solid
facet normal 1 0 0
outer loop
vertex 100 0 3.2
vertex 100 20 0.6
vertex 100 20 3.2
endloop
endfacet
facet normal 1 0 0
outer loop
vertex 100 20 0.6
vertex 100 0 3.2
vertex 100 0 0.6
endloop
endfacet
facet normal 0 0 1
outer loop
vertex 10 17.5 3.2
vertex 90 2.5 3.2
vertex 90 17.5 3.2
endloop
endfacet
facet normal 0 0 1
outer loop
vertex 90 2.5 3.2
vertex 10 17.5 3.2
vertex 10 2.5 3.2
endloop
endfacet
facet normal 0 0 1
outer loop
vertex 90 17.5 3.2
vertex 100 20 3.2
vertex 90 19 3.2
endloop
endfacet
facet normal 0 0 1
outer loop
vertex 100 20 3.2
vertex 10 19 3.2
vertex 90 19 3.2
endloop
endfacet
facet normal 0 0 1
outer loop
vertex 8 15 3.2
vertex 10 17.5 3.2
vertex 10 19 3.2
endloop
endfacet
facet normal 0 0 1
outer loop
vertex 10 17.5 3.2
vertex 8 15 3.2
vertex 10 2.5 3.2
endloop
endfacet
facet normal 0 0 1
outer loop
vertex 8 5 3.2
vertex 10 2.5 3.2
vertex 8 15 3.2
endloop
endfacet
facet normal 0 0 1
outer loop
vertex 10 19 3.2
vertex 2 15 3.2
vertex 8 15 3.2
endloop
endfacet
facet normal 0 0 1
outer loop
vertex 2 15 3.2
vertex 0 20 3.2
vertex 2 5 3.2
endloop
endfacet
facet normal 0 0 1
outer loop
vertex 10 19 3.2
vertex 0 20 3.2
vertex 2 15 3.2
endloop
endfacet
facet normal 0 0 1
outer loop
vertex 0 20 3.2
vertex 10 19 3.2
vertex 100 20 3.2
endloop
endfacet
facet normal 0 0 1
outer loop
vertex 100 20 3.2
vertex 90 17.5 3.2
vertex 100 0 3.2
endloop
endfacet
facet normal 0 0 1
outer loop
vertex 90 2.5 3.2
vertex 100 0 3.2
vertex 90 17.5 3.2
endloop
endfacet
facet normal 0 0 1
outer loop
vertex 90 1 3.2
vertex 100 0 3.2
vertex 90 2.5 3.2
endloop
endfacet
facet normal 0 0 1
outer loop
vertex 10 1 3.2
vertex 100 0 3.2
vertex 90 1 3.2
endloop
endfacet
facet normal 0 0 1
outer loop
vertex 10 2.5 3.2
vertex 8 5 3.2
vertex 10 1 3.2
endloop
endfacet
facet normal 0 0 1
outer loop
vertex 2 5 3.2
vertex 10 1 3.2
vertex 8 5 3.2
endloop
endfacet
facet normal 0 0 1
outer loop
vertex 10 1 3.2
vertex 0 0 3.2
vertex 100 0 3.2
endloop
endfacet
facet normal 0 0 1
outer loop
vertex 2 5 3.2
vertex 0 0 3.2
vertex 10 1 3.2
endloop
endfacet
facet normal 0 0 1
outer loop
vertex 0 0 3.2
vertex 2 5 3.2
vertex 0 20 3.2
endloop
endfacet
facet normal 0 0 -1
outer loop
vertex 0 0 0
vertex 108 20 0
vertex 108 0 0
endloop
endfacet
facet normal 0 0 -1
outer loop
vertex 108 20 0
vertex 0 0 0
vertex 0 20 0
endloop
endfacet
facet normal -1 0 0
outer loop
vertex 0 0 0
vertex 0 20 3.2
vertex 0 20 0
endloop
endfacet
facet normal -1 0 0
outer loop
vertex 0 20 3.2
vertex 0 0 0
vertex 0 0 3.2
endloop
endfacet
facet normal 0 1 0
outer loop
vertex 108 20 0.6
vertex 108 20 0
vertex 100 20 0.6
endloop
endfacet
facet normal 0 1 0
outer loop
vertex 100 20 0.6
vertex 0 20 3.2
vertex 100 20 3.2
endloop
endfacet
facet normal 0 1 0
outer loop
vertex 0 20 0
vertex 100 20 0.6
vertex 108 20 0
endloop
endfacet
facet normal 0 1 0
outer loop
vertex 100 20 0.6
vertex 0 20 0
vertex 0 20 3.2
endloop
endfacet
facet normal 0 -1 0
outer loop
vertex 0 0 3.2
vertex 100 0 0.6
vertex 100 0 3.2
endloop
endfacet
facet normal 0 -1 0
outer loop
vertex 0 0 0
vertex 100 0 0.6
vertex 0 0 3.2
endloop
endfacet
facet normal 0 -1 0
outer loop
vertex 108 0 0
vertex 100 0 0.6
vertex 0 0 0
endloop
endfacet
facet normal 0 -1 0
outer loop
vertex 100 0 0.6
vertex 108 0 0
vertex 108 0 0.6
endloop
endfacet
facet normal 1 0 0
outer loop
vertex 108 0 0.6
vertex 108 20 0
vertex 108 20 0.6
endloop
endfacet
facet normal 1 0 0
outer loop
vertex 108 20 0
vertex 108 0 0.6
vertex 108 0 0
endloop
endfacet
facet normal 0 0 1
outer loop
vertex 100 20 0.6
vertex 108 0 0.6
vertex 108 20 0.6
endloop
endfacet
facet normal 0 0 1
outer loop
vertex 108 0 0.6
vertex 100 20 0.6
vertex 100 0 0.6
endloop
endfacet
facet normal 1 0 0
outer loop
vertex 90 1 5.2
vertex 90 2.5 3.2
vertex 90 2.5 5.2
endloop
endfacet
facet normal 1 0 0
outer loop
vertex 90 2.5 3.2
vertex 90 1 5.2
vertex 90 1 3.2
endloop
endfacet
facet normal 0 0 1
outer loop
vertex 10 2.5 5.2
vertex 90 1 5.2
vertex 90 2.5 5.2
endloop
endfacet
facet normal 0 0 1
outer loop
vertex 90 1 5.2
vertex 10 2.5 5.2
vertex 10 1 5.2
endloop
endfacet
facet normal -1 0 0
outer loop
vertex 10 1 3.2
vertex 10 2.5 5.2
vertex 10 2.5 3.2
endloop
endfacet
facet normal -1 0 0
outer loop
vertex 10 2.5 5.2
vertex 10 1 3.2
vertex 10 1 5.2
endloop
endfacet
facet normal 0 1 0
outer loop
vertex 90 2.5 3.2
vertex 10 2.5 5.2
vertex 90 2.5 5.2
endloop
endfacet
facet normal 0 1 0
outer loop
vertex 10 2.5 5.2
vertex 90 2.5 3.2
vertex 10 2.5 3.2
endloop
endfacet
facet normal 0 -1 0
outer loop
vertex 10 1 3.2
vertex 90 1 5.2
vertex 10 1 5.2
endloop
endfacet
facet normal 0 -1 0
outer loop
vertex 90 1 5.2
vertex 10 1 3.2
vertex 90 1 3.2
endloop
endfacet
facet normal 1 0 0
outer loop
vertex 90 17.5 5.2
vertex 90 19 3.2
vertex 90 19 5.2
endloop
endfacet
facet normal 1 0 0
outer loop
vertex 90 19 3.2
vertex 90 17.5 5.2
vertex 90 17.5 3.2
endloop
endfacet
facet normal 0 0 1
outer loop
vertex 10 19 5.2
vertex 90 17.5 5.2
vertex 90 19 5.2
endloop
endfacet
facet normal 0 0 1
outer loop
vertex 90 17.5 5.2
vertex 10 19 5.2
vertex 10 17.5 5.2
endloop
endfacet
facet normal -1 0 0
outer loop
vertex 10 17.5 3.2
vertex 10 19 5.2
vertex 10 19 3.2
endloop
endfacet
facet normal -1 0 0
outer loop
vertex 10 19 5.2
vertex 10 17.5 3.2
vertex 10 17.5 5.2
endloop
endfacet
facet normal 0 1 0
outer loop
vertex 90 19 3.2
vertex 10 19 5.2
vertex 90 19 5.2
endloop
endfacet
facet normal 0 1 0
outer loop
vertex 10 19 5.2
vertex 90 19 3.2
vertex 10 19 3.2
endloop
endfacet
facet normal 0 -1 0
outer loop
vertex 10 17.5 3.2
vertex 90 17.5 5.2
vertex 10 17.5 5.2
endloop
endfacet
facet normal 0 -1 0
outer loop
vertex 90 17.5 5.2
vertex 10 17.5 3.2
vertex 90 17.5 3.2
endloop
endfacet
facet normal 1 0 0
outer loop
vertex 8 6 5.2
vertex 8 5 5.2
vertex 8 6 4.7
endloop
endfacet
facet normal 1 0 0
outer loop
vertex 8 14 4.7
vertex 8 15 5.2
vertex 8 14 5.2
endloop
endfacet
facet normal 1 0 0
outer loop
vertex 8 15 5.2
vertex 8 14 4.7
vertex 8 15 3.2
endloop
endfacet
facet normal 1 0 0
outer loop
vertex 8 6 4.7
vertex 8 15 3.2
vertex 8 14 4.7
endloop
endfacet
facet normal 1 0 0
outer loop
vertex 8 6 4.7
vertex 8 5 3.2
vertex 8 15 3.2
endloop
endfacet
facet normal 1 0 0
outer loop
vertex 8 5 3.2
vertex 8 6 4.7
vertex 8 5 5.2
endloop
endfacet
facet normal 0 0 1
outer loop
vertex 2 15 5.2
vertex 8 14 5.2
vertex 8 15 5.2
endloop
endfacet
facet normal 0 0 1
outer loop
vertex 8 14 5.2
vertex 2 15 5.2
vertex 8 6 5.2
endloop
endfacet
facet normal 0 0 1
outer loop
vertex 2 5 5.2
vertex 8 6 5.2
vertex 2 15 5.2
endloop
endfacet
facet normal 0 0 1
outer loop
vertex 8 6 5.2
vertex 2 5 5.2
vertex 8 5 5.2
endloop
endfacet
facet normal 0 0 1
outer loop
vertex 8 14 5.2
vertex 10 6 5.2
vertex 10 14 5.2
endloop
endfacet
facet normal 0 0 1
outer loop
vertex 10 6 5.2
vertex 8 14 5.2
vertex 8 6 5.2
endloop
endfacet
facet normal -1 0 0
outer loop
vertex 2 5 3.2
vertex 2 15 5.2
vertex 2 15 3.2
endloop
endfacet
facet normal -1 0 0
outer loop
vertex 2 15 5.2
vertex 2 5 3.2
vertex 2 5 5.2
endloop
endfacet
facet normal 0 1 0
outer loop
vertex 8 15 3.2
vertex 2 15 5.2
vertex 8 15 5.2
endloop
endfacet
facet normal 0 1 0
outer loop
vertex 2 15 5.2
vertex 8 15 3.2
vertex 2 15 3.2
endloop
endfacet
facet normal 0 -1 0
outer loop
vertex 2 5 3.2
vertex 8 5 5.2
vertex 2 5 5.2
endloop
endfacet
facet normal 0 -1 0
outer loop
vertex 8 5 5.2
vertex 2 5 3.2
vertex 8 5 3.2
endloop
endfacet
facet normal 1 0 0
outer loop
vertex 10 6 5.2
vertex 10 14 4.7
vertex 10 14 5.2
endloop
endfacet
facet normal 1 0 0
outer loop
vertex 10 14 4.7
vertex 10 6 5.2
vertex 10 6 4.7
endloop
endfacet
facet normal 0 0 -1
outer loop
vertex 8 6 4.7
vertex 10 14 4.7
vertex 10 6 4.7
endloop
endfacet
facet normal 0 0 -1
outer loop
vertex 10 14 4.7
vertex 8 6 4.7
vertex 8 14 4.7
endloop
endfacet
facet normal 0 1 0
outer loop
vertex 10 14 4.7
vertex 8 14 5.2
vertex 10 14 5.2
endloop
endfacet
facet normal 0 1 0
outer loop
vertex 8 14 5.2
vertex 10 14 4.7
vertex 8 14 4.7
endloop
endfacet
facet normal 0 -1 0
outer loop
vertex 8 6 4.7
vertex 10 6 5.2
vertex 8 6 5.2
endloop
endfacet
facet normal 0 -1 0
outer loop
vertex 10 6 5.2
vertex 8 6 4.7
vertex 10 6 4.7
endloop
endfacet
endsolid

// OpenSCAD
// Bag clip with living hinge - PETG, 0.4mm nozzle, no supports
// One piece, printed open flat. Lower arm + upper arm meet at hinge mid-plane.
// Fold map (180 about pivot): F(x) = 216 - x, F(z) = 10.4 - z.

part = "arm_lower"; // [arm_lower, arm_upper, assembly]
cadverify_only = "";

Lbody = 100;
Wbody = 20;
Tbody = 3.2;
Hhalf = 8;
Thinge = 0.6;
Bgap = 2.0;
Xpiv = 108;
Zpiv = 5.2;

module instance(name, part, unit = 1) {
    echo(cadverify_instance = [name, part, unit]);
    if (cadverify_only == "" || cadverify_only == name) children();
}

module arm_lower() {
    cube([Lbody, Wbody, Tbody], false);
    translate([Lbody-0.1, 0, 0])
        cube([Hhalf+0.1, Wbody, Thinge], false);
    translate([10, 1, Tbody-0.1])
        cube([80, 1.5, Bgap+0.1], false);
    translate([10, 17.5, Tbody-0.1])
        cube([80, 1.5, Bgap+0.1], false);
    translate([2, 5, Tbody-0.1])
        cube([6, 10, Bgap+0.1], false);
    translate([7.9, 6, 4.7])
        cube([2.1, 8, 0.5], false);
}

module arm_upper() {
    cube([Hhalf+0.1, Wbody, Thinge], false);
    translate([Hhalf-0.1, 0, 0])
        cube([Lbody+0.1, Wbody, Tbody], false);
    translate([100, 5, Tbody-0.1])
        cube([6, 10, Bgap+0.1], false);
    translate([97.9, 6, 4.7])
        cube([2.5, 8, 0.5], false);
    translate([107.9, 6, 0])
        cube([8.1, 8, Tbody], false);
}

if (part == "arm_lower") {
    echo(cadverify_spec = [
        ["bounds", [[0, 0, 0], [108, 20, 5.2]]],
        ["bodies", 1],
        ["through_holes", 0],
        ["support_faces", [["bed", "-z", 1500]]],
        ["overhangs_allowed", [["latch lip", [[7.5, 5.5, 4.5], [10.5, 14.5, 5.5]]]]],
        ["copies", 1],
        ["details", [
            ["arm", "material", [[20, 6, 1.0], [80, 14, 2.2]], 1],
            ["arm_wall", "thickness", [50, 10, 10], [0, 0, -1], 3.2],
            ["hinge", "thickness", [104, 10, 5], [0, 0, -1], 0.6],
            ["rib", "material", [[20, 1.2, 3.5], [80, 2.3, 5.0]], 1],
            ["latch_tower", "material", [[3, 6, 3.5], [7, 14, 5.0]], 1],
            ["latch_lip", "material", [[8.2, 7, 4.8], [9.7, 13, 5.1]], 1],
            ["bag_slot", "void", [[20, 3, 3.5], [80, 17, 5.0]], 1]
        ]]
    ]);
    arm_lower();
} else if (part == "arm_upper") {
    echo(cadverify_spec = [
        ["bounds", [[0, 0, 0], [116, 20, 5.2]]],
        ["bodies", 1],
        ["through_holes", 0],
        ["support_faces", [["bed", "-z", 1500]]],
        ["overhangs_allowed", [["latch lip", [[97.5, 5.5, 4.5], [100.8, 14.5, 5.5]]]]],
        ["copies", 1],
        ["details", [
            ["arm", "material", [[15, 6, 1.0], [80, 14, 2.2]], 0.99],
            ["arm_wall", "thickness", [50, 10, 10], [0, 0, -1], 3.2],
            ["hinge", "thickness", [4, 10, 5], [0, 0, -1], 0.6],
            ["latch_tower", "material", [[100.5, 6, 3.5], [105.5, 14, 5.0]], 1],
            ["latch_lip", "material", [[98.2, 7, 4.8], [100.1, 13, 5.1]], 1],
            ["thumb_tab", "material", [[108.5, 7, 1.0], [115, 13, 2.2]], 1],
            ["field", "void", [[15, 3, 3.5], [80, 17, 5.0]], 1]
        ]]
    ]);
    arm_upper();
} else if (part == "assembly") {
    echo(cadverify_spec = [
        ["bounds", [[0, 0, 0], [224, 20, 5.2]]],
        ["support_faces", [["bed", "-z", 3000]]],
        ["motions", [
            ["close", ["upper"], "rotate", [108, 10, 5.2], [0, -1, 0], [0, 180],
                ["flex", [["upper", "lower", 1.0, "latch snap"]]],
                ["stops", [180]]
            ]
        ]],
        ["assembly_order", [
            [["lower"], [0, 0, 0]],
            [["upper"], [0, 0, -1]]
        ]]
    ]);
    instance("lower", "arm_lower") arm_lower();
    instance("upper", "arm_upper") translate([108, 0, 0]) arm_upper();
}
